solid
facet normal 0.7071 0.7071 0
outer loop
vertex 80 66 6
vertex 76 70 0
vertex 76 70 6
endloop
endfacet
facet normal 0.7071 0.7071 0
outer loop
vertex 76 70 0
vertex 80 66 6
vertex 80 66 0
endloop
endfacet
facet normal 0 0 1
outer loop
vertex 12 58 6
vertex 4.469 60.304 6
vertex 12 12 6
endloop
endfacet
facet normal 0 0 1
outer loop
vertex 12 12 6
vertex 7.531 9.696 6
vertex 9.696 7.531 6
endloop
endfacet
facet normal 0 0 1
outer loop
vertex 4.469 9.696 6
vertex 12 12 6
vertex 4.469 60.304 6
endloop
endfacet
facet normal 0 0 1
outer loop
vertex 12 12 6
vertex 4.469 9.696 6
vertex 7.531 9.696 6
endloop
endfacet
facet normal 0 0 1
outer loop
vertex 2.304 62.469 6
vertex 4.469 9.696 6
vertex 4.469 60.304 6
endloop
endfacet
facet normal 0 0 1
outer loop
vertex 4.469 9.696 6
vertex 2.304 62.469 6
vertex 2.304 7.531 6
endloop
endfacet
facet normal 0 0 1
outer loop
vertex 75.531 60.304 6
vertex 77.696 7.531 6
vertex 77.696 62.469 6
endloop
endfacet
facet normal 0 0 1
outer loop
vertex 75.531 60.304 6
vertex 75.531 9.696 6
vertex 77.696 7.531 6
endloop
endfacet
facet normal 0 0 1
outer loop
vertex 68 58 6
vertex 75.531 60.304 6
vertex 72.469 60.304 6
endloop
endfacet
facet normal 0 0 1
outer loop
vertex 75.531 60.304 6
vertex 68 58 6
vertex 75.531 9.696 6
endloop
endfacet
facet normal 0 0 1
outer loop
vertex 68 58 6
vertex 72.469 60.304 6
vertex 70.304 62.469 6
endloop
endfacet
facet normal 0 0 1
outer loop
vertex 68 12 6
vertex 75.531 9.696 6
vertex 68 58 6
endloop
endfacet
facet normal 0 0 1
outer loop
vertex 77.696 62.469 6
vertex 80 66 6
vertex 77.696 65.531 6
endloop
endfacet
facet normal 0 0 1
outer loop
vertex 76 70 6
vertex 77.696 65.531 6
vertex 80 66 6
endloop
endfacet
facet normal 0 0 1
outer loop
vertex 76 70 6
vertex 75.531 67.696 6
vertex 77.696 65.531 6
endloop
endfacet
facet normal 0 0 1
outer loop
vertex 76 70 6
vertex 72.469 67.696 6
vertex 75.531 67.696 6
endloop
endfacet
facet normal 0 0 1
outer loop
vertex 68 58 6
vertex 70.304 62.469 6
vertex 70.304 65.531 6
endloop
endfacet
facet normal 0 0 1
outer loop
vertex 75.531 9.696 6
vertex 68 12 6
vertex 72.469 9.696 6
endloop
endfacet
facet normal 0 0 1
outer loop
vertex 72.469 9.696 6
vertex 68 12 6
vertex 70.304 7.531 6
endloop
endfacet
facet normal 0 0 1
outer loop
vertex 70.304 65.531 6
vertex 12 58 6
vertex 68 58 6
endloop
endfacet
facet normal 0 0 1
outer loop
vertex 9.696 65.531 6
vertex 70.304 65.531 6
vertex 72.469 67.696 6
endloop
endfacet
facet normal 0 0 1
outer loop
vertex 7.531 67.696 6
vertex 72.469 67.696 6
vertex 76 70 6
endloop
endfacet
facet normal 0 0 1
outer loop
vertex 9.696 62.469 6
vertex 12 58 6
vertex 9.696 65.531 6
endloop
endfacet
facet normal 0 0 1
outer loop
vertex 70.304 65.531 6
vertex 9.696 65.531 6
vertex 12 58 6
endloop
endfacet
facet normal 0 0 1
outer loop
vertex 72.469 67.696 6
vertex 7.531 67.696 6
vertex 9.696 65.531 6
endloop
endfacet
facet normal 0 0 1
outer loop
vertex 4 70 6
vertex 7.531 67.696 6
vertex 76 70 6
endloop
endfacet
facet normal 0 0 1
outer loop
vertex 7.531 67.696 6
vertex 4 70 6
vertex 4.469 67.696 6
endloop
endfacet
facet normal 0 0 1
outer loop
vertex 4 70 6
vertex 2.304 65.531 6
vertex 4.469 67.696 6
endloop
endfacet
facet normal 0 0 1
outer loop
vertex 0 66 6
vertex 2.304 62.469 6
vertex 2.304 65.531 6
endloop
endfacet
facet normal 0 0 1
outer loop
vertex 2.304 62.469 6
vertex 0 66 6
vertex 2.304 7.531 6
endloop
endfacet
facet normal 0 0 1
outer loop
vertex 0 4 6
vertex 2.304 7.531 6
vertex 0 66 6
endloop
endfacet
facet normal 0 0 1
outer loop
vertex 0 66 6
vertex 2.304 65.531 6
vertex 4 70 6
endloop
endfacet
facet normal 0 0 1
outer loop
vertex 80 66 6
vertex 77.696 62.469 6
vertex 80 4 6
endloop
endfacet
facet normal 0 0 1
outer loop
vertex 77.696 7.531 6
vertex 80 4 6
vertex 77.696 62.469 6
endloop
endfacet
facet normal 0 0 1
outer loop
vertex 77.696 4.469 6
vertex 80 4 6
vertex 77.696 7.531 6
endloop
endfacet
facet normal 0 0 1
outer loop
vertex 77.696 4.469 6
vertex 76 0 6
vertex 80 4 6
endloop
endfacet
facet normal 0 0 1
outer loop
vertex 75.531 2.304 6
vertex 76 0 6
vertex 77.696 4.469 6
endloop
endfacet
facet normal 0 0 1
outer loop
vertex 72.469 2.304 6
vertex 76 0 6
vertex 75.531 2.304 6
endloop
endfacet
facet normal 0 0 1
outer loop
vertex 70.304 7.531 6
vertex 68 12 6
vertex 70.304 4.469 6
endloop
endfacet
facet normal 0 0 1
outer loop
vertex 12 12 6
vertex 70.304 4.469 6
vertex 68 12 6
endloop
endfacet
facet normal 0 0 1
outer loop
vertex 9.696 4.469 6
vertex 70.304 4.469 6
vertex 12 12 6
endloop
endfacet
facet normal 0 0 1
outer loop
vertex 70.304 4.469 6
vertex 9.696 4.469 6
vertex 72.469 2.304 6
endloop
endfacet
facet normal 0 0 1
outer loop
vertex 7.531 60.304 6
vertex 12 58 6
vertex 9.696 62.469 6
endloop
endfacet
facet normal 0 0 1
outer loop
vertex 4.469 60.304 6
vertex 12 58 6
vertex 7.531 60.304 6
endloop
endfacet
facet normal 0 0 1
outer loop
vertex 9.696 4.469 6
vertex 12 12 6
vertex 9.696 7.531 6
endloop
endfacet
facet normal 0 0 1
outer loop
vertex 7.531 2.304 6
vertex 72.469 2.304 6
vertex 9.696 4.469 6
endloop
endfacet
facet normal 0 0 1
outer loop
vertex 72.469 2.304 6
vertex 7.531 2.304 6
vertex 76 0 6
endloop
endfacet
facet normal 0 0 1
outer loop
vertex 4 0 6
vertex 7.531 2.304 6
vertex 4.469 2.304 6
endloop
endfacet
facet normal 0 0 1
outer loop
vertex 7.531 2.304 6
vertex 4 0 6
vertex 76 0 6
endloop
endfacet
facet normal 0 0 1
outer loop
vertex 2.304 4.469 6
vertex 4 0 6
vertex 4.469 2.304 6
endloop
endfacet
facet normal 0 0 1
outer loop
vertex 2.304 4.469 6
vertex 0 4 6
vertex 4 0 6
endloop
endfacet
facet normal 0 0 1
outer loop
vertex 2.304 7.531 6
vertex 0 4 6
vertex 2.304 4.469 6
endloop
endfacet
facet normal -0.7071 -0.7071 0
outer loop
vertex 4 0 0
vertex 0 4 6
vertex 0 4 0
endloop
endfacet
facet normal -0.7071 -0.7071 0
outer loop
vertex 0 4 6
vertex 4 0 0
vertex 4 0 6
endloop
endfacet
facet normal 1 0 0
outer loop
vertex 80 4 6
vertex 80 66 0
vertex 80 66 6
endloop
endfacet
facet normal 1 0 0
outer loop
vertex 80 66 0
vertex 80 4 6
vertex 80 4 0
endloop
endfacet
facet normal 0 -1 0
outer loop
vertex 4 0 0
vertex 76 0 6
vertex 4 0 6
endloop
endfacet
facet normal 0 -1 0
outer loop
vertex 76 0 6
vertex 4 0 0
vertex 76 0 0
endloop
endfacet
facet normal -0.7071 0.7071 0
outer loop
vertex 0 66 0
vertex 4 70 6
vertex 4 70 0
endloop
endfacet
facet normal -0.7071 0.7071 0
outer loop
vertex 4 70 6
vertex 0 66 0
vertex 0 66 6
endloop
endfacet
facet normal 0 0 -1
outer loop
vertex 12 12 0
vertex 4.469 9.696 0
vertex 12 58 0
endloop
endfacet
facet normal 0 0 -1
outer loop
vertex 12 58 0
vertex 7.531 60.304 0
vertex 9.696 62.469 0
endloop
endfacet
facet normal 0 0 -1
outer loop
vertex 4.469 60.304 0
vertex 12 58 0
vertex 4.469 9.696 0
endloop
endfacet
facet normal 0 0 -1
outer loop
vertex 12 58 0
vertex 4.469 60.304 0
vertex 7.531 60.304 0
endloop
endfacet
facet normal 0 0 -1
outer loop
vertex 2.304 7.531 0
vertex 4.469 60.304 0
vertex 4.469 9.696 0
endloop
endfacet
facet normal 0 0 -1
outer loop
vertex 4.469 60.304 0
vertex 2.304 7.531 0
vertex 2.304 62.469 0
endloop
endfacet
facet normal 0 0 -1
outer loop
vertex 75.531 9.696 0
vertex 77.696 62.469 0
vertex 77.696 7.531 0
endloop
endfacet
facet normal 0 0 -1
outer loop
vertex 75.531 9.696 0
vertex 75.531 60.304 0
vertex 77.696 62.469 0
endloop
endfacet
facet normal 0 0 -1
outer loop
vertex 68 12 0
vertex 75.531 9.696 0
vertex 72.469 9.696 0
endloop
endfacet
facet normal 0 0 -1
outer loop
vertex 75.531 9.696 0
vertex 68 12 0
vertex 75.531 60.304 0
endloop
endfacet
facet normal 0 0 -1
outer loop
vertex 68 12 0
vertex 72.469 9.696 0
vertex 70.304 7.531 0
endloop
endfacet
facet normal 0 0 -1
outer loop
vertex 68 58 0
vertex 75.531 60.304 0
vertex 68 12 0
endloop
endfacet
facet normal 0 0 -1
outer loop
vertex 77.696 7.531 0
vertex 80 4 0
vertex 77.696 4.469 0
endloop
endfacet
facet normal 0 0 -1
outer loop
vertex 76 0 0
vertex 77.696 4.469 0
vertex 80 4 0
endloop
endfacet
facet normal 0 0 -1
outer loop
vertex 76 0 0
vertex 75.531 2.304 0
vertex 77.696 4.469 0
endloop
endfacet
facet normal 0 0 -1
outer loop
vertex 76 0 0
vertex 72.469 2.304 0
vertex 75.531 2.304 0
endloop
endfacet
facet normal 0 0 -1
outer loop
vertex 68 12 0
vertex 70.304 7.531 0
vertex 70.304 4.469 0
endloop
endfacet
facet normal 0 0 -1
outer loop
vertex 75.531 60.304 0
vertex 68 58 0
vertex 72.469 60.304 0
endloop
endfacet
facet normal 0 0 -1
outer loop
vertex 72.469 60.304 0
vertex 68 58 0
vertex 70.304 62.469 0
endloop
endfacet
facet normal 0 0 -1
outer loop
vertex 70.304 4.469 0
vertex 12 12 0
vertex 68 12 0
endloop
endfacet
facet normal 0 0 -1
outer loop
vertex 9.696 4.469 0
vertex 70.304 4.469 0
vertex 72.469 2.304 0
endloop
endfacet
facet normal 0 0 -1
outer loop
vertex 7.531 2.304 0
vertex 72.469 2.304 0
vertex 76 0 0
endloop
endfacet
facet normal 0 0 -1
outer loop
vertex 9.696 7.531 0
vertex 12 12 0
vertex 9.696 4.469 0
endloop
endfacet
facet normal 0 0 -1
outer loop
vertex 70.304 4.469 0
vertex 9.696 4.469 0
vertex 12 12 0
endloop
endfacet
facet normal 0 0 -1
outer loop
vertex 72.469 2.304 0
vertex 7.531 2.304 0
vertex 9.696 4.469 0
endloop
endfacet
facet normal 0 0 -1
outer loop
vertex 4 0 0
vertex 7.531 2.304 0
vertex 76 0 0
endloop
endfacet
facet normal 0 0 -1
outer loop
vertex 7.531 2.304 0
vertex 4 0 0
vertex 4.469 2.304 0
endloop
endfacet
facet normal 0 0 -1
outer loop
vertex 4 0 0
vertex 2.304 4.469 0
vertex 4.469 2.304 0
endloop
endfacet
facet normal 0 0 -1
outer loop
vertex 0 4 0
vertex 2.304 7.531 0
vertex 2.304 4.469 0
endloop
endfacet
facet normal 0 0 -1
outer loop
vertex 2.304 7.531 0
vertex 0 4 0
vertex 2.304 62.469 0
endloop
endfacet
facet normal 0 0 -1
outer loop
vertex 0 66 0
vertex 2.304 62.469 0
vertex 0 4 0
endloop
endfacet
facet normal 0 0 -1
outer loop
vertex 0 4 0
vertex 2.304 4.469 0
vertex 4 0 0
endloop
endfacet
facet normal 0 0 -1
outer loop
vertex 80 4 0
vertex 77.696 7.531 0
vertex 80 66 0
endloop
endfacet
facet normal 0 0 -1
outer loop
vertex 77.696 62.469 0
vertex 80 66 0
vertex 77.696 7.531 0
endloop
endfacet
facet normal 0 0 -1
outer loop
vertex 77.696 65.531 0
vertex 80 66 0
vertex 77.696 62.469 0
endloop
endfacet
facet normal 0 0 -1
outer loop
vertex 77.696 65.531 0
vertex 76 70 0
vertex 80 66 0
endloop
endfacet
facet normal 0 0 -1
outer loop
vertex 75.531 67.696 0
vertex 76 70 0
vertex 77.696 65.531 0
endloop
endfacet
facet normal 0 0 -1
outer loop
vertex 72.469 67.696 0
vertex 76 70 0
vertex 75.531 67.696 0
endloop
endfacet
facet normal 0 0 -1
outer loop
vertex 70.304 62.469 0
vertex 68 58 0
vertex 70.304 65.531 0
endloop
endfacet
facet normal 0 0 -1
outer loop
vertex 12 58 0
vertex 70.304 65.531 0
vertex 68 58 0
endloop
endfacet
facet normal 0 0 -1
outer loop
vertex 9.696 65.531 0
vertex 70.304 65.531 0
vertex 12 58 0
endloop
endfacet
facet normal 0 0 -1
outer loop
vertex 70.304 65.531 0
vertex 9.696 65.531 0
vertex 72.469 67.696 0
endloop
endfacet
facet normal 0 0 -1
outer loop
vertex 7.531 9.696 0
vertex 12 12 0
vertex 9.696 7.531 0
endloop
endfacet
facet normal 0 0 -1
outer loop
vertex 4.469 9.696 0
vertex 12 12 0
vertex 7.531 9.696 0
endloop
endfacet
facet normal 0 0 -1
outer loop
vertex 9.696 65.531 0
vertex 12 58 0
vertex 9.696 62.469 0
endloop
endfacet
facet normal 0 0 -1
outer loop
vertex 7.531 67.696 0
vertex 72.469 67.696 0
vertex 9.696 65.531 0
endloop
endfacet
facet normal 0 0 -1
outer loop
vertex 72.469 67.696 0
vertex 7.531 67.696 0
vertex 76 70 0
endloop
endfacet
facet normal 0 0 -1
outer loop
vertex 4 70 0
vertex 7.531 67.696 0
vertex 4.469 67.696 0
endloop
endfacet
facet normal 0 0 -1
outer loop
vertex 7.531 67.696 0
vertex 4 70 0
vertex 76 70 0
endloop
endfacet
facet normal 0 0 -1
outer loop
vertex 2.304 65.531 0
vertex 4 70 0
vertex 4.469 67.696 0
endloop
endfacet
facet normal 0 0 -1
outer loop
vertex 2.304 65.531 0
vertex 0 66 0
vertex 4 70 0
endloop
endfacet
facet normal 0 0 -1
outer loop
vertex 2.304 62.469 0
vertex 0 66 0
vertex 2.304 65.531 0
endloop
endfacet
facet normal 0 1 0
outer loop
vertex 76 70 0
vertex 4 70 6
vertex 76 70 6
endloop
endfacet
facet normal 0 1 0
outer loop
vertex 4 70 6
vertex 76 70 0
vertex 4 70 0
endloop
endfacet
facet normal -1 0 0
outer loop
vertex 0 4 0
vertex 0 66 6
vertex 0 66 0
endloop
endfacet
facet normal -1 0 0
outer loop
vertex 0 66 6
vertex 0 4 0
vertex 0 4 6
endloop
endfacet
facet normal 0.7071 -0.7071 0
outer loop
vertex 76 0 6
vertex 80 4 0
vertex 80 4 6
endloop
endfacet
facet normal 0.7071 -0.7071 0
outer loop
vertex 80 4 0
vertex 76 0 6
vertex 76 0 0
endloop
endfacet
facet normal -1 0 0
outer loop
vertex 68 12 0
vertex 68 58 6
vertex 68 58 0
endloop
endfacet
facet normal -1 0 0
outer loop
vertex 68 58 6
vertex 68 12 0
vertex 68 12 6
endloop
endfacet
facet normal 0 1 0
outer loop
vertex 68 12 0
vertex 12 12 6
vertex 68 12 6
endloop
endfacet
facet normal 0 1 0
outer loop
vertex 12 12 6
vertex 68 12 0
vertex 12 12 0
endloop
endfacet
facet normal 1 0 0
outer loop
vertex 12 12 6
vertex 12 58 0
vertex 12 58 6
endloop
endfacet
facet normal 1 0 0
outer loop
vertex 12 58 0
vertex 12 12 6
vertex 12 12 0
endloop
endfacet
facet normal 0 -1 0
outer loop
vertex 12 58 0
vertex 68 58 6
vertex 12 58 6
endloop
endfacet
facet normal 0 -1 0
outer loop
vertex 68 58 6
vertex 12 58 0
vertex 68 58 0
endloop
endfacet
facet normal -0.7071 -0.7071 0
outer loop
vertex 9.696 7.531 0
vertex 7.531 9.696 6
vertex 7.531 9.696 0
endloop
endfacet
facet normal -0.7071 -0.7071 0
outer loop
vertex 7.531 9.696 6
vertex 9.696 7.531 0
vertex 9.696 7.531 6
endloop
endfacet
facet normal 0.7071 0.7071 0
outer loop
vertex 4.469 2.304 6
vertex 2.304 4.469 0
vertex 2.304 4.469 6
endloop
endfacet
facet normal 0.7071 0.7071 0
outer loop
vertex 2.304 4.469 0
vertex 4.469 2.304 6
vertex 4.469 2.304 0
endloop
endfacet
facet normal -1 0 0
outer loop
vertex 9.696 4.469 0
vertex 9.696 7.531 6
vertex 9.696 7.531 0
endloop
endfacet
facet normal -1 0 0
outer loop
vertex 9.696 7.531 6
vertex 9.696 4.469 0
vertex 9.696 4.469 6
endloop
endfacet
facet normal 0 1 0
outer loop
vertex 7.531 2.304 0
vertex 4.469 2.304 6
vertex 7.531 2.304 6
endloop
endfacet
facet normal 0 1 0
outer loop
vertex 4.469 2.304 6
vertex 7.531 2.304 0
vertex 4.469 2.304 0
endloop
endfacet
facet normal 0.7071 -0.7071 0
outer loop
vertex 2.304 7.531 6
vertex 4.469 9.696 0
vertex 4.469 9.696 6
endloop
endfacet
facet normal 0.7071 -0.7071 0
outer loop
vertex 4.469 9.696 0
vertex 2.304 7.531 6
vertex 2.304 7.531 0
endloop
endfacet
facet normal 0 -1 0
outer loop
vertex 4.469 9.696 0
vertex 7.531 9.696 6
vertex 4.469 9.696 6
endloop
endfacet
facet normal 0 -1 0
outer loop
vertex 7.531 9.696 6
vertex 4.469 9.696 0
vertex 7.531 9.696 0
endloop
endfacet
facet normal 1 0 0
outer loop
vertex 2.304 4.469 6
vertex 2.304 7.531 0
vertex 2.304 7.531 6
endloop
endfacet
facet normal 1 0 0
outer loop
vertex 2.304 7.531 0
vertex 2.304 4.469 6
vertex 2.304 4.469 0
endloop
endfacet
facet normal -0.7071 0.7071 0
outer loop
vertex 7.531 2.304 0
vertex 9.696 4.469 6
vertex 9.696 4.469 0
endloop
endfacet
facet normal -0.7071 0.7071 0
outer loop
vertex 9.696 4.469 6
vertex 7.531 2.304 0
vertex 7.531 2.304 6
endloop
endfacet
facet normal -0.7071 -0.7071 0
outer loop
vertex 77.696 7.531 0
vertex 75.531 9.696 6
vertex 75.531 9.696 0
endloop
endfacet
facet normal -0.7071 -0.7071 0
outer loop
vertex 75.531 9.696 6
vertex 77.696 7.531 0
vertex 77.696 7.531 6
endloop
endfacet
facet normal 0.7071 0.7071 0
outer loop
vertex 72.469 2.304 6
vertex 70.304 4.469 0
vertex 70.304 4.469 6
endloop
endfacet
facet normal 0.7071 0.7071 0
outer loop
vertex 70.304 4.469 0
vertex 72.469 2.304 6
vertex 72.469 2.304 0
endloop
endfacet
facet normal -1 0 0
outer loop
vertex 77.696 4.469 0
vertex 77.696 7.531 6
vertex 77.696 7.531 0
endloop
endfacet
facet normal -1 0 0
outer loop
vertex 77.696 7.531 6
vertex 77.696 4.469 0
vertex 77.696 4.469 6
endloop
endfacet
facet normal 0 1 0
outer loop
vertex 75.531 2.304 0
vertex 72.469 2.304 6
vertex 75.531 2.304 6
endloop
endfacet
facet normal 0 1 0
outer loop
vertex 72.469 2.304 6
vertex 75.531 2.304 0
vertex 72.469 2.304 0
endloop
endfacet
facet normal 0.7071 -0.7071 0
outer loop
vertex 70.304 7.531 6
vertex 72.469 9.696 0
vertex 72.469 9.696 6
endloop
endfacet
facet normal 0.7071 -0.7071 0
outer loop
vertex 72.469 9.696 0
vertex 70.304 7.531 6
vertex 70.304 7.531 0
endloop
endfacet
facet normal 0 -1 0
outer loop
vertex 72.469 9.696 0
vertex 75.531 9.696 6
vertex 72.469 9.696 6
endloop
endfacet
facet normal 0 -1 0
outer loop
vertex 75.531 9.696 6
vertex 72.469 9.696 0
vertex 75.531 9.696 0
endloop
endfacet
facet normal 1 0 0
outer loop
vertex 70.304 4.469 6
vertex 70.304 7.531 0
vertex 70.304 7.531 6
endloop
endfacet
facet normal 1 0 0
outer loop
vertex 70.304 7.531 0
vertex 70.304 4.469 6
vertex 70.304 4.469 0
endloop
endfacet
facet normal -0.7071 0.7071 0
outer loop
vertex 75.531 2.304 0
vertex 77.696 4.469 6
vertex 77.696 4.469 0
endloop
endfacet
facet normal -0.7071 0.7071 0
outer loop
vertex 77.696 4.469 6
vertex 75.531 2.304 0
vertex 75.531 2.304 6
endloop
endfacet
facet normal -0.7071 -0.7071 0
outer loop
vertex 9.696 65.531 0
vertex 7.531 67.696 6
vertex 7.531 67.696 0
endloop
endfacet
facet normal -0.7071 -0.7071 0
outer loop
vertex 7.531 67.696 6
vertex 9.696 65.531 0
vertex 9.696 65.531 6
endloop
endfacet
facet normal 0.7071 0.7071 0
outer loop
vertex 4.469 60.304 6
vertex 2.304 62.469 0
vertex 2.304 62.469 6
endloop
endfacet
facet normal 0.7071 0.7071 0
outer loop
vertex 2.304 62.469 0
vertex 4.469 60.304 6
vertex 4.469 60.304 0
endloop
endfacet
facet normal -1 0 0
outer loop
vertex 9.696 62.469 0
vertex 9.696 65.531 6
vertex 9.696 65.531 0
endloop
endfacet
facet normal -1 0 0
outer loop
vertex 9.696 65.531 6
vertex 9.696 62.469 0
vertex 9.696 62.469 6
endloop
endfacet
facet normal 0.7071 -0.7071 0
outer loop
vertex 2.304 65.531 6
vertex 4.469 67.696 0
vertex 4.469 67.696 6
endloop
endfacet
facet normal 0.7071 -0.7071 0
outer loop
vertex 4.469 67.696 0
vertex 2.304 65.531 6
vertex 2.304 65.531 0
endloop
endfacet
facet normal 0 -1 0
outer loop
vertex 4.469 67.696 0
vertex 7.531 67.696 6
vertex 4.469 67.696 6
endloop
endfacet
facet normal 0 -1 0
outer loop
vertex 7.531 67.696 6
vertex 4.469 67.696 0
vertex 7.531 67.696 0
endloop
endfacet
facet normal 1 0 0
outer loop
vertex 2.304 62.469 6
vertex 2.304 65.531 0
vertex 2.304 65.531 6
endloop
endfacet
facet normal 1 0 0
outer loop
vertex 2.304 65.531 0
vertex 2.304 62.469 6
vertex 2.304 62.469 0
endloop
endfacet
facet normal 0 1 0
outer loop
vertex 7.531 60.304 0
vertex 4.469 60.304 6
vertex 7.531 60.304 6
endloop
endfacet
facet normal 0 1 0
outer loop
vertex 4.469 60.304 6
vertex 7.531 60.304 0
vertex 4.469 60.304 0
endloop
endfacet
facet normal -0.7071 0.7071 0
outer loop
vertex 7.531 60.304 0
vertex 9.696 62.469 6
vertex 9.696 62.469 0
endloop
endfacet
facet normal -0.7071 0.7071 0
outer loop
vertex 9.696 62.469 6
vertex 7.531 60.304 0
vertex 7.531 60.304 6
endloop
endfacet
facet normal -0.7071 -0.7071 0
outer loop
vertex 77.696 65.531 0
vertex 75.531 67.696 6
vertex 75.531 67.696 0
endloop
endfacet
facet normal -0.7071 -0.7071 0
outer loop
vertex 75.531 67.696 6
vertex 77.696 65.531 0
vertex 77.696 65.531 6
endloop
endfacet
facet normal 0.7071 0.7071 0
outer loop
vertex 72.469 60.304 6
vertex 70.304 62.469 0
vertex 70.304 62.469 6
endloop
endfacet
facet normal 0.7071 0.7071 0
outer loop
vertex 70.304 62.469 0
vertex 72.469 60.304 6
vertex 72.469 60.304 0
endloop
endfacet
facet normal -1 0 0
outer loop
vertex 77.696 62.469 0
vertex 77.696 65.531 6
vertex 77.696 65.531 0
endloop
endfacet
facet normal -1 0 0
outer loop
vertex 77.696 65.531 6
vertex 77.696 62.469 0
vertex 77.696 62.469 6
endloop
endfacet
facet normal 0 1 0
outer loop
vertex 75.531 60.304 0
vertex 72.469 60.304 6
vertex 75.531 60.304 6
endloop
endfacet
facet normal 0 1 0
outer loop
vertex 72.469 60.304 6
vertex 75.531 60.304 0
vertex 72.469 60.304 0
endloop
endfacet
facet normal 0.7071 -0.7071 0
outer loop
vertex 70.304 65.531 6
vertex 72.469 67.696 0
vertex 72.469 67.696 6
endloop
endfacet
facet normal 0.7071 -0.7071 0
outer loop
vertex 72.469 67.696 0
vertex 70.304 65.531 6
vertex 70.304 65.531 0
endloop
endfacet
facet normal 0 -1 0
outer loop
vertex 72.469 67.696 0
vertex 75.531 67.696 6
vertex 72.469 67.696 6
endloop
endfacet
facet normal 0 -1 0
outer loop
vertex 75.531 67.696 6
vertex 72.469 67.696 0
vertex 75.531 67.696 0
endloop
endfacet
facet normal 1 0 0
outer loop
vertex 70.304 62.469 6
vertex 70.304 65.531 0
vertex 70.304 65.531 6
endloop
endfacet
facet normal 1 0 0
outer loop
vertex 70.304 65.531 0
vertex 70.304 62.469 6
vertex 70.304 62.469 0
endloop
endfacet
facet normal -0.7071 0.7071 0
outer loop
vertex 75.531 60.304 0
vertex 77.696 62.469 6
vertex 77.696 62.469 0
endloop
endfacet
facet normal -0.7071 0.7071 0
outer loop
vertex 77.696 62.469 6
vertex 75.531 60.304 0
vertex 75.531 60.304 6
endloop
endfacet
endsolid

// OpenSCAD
$fn = 32;

// ----------------------------------------------------------------------
// Frame plate: 80 x 70 frame, 12 mm rails
// ----------------------------------------------------------------------

// --- parameters (mm) ---
plate_l = 80;             // plate length, X
plate_w = 70;             // plate width, Y
plate_t = 6;              // plate thickness, Z (extrusion height)
corner_c = 4;             // corner chamfer
frame_bar = 12;           // frame rail width
bolt_r = 4;               // corner bolt window radius
bolt_inset = 6;           // bolt centre inset from the edges

win_l = plate_l - 2 * frame_bar;  // window length
win_w = plate_w - 2 * frame_bar;  // window width
bolt_d = 2 * bolt_r;  // corner hole diameter

profile = [[4, 0], [76, 0], [80, 4], [80, 66], [76, 70], [4, 70], [0, 66], [0, 4]];  // primary outline, 8 points, counter clockwise
void_1 = [[12, 12], [68, 12], [68, 58], [12, 58]];  // the window, 4 points
void_2 = [[9.696, 7.531], [7.531, 9.696], [4.469, 9.696], [2.304, 7.531], [2.304, 4.469], [4.469, 2.304], [7.531, 2.304], [9.696, 4.469]];  // corner bolt window, 8 points
void_3 = [[77.696, 7.531], [75.531, 9.696], [72.469, 9.696], [70.304, 7.531], [70.304, 4.469], [72.469, 2.304], [75.531, 2.304], [77.696, 4.469]];  // corner bolt window, 8 points
void_4 = [[9.696, 65.531], [7.531, 67.696], [4.469, 67.696], [2.304, 65.531], [2.304, 62.469], [4.469, 60.304], [7.531, 60.304], [9.696, 62.469]];  // corner bolt window, 8 points
void_5 = [[77.696, 65.531], [75.531, 67.696], [72.469, 67.696], [70.304, 65.531], [70.304, 62.469], [72.469, 60.304], [75.531, 60.304], [77.696, 62.469]];  // corner bolt window, 8 points

// --- the one profile operation ---
difference() {
  linear_extrude(height = plate_t) polygon(points = profile);
  translate([0, 0, -1])
    linear_extrude(height = plate_t + 2) polygon(points = void_1);
  translate([0, 0, -1])
    linear_extrude(height = plate_t + 2) polygon(points = void_2);
  translate([0, 0, -1])
    linear_extrude(height = plate_t + 2) polygon(points = void_3);
  translate([0, 0, -1])
    linear_extrude(height = plate_t + 2) polygon(points = void_4);
  translate([0, 0, -1])
    linear_extrude(height = plate_t + 2) polygon(points = void_5);
}
